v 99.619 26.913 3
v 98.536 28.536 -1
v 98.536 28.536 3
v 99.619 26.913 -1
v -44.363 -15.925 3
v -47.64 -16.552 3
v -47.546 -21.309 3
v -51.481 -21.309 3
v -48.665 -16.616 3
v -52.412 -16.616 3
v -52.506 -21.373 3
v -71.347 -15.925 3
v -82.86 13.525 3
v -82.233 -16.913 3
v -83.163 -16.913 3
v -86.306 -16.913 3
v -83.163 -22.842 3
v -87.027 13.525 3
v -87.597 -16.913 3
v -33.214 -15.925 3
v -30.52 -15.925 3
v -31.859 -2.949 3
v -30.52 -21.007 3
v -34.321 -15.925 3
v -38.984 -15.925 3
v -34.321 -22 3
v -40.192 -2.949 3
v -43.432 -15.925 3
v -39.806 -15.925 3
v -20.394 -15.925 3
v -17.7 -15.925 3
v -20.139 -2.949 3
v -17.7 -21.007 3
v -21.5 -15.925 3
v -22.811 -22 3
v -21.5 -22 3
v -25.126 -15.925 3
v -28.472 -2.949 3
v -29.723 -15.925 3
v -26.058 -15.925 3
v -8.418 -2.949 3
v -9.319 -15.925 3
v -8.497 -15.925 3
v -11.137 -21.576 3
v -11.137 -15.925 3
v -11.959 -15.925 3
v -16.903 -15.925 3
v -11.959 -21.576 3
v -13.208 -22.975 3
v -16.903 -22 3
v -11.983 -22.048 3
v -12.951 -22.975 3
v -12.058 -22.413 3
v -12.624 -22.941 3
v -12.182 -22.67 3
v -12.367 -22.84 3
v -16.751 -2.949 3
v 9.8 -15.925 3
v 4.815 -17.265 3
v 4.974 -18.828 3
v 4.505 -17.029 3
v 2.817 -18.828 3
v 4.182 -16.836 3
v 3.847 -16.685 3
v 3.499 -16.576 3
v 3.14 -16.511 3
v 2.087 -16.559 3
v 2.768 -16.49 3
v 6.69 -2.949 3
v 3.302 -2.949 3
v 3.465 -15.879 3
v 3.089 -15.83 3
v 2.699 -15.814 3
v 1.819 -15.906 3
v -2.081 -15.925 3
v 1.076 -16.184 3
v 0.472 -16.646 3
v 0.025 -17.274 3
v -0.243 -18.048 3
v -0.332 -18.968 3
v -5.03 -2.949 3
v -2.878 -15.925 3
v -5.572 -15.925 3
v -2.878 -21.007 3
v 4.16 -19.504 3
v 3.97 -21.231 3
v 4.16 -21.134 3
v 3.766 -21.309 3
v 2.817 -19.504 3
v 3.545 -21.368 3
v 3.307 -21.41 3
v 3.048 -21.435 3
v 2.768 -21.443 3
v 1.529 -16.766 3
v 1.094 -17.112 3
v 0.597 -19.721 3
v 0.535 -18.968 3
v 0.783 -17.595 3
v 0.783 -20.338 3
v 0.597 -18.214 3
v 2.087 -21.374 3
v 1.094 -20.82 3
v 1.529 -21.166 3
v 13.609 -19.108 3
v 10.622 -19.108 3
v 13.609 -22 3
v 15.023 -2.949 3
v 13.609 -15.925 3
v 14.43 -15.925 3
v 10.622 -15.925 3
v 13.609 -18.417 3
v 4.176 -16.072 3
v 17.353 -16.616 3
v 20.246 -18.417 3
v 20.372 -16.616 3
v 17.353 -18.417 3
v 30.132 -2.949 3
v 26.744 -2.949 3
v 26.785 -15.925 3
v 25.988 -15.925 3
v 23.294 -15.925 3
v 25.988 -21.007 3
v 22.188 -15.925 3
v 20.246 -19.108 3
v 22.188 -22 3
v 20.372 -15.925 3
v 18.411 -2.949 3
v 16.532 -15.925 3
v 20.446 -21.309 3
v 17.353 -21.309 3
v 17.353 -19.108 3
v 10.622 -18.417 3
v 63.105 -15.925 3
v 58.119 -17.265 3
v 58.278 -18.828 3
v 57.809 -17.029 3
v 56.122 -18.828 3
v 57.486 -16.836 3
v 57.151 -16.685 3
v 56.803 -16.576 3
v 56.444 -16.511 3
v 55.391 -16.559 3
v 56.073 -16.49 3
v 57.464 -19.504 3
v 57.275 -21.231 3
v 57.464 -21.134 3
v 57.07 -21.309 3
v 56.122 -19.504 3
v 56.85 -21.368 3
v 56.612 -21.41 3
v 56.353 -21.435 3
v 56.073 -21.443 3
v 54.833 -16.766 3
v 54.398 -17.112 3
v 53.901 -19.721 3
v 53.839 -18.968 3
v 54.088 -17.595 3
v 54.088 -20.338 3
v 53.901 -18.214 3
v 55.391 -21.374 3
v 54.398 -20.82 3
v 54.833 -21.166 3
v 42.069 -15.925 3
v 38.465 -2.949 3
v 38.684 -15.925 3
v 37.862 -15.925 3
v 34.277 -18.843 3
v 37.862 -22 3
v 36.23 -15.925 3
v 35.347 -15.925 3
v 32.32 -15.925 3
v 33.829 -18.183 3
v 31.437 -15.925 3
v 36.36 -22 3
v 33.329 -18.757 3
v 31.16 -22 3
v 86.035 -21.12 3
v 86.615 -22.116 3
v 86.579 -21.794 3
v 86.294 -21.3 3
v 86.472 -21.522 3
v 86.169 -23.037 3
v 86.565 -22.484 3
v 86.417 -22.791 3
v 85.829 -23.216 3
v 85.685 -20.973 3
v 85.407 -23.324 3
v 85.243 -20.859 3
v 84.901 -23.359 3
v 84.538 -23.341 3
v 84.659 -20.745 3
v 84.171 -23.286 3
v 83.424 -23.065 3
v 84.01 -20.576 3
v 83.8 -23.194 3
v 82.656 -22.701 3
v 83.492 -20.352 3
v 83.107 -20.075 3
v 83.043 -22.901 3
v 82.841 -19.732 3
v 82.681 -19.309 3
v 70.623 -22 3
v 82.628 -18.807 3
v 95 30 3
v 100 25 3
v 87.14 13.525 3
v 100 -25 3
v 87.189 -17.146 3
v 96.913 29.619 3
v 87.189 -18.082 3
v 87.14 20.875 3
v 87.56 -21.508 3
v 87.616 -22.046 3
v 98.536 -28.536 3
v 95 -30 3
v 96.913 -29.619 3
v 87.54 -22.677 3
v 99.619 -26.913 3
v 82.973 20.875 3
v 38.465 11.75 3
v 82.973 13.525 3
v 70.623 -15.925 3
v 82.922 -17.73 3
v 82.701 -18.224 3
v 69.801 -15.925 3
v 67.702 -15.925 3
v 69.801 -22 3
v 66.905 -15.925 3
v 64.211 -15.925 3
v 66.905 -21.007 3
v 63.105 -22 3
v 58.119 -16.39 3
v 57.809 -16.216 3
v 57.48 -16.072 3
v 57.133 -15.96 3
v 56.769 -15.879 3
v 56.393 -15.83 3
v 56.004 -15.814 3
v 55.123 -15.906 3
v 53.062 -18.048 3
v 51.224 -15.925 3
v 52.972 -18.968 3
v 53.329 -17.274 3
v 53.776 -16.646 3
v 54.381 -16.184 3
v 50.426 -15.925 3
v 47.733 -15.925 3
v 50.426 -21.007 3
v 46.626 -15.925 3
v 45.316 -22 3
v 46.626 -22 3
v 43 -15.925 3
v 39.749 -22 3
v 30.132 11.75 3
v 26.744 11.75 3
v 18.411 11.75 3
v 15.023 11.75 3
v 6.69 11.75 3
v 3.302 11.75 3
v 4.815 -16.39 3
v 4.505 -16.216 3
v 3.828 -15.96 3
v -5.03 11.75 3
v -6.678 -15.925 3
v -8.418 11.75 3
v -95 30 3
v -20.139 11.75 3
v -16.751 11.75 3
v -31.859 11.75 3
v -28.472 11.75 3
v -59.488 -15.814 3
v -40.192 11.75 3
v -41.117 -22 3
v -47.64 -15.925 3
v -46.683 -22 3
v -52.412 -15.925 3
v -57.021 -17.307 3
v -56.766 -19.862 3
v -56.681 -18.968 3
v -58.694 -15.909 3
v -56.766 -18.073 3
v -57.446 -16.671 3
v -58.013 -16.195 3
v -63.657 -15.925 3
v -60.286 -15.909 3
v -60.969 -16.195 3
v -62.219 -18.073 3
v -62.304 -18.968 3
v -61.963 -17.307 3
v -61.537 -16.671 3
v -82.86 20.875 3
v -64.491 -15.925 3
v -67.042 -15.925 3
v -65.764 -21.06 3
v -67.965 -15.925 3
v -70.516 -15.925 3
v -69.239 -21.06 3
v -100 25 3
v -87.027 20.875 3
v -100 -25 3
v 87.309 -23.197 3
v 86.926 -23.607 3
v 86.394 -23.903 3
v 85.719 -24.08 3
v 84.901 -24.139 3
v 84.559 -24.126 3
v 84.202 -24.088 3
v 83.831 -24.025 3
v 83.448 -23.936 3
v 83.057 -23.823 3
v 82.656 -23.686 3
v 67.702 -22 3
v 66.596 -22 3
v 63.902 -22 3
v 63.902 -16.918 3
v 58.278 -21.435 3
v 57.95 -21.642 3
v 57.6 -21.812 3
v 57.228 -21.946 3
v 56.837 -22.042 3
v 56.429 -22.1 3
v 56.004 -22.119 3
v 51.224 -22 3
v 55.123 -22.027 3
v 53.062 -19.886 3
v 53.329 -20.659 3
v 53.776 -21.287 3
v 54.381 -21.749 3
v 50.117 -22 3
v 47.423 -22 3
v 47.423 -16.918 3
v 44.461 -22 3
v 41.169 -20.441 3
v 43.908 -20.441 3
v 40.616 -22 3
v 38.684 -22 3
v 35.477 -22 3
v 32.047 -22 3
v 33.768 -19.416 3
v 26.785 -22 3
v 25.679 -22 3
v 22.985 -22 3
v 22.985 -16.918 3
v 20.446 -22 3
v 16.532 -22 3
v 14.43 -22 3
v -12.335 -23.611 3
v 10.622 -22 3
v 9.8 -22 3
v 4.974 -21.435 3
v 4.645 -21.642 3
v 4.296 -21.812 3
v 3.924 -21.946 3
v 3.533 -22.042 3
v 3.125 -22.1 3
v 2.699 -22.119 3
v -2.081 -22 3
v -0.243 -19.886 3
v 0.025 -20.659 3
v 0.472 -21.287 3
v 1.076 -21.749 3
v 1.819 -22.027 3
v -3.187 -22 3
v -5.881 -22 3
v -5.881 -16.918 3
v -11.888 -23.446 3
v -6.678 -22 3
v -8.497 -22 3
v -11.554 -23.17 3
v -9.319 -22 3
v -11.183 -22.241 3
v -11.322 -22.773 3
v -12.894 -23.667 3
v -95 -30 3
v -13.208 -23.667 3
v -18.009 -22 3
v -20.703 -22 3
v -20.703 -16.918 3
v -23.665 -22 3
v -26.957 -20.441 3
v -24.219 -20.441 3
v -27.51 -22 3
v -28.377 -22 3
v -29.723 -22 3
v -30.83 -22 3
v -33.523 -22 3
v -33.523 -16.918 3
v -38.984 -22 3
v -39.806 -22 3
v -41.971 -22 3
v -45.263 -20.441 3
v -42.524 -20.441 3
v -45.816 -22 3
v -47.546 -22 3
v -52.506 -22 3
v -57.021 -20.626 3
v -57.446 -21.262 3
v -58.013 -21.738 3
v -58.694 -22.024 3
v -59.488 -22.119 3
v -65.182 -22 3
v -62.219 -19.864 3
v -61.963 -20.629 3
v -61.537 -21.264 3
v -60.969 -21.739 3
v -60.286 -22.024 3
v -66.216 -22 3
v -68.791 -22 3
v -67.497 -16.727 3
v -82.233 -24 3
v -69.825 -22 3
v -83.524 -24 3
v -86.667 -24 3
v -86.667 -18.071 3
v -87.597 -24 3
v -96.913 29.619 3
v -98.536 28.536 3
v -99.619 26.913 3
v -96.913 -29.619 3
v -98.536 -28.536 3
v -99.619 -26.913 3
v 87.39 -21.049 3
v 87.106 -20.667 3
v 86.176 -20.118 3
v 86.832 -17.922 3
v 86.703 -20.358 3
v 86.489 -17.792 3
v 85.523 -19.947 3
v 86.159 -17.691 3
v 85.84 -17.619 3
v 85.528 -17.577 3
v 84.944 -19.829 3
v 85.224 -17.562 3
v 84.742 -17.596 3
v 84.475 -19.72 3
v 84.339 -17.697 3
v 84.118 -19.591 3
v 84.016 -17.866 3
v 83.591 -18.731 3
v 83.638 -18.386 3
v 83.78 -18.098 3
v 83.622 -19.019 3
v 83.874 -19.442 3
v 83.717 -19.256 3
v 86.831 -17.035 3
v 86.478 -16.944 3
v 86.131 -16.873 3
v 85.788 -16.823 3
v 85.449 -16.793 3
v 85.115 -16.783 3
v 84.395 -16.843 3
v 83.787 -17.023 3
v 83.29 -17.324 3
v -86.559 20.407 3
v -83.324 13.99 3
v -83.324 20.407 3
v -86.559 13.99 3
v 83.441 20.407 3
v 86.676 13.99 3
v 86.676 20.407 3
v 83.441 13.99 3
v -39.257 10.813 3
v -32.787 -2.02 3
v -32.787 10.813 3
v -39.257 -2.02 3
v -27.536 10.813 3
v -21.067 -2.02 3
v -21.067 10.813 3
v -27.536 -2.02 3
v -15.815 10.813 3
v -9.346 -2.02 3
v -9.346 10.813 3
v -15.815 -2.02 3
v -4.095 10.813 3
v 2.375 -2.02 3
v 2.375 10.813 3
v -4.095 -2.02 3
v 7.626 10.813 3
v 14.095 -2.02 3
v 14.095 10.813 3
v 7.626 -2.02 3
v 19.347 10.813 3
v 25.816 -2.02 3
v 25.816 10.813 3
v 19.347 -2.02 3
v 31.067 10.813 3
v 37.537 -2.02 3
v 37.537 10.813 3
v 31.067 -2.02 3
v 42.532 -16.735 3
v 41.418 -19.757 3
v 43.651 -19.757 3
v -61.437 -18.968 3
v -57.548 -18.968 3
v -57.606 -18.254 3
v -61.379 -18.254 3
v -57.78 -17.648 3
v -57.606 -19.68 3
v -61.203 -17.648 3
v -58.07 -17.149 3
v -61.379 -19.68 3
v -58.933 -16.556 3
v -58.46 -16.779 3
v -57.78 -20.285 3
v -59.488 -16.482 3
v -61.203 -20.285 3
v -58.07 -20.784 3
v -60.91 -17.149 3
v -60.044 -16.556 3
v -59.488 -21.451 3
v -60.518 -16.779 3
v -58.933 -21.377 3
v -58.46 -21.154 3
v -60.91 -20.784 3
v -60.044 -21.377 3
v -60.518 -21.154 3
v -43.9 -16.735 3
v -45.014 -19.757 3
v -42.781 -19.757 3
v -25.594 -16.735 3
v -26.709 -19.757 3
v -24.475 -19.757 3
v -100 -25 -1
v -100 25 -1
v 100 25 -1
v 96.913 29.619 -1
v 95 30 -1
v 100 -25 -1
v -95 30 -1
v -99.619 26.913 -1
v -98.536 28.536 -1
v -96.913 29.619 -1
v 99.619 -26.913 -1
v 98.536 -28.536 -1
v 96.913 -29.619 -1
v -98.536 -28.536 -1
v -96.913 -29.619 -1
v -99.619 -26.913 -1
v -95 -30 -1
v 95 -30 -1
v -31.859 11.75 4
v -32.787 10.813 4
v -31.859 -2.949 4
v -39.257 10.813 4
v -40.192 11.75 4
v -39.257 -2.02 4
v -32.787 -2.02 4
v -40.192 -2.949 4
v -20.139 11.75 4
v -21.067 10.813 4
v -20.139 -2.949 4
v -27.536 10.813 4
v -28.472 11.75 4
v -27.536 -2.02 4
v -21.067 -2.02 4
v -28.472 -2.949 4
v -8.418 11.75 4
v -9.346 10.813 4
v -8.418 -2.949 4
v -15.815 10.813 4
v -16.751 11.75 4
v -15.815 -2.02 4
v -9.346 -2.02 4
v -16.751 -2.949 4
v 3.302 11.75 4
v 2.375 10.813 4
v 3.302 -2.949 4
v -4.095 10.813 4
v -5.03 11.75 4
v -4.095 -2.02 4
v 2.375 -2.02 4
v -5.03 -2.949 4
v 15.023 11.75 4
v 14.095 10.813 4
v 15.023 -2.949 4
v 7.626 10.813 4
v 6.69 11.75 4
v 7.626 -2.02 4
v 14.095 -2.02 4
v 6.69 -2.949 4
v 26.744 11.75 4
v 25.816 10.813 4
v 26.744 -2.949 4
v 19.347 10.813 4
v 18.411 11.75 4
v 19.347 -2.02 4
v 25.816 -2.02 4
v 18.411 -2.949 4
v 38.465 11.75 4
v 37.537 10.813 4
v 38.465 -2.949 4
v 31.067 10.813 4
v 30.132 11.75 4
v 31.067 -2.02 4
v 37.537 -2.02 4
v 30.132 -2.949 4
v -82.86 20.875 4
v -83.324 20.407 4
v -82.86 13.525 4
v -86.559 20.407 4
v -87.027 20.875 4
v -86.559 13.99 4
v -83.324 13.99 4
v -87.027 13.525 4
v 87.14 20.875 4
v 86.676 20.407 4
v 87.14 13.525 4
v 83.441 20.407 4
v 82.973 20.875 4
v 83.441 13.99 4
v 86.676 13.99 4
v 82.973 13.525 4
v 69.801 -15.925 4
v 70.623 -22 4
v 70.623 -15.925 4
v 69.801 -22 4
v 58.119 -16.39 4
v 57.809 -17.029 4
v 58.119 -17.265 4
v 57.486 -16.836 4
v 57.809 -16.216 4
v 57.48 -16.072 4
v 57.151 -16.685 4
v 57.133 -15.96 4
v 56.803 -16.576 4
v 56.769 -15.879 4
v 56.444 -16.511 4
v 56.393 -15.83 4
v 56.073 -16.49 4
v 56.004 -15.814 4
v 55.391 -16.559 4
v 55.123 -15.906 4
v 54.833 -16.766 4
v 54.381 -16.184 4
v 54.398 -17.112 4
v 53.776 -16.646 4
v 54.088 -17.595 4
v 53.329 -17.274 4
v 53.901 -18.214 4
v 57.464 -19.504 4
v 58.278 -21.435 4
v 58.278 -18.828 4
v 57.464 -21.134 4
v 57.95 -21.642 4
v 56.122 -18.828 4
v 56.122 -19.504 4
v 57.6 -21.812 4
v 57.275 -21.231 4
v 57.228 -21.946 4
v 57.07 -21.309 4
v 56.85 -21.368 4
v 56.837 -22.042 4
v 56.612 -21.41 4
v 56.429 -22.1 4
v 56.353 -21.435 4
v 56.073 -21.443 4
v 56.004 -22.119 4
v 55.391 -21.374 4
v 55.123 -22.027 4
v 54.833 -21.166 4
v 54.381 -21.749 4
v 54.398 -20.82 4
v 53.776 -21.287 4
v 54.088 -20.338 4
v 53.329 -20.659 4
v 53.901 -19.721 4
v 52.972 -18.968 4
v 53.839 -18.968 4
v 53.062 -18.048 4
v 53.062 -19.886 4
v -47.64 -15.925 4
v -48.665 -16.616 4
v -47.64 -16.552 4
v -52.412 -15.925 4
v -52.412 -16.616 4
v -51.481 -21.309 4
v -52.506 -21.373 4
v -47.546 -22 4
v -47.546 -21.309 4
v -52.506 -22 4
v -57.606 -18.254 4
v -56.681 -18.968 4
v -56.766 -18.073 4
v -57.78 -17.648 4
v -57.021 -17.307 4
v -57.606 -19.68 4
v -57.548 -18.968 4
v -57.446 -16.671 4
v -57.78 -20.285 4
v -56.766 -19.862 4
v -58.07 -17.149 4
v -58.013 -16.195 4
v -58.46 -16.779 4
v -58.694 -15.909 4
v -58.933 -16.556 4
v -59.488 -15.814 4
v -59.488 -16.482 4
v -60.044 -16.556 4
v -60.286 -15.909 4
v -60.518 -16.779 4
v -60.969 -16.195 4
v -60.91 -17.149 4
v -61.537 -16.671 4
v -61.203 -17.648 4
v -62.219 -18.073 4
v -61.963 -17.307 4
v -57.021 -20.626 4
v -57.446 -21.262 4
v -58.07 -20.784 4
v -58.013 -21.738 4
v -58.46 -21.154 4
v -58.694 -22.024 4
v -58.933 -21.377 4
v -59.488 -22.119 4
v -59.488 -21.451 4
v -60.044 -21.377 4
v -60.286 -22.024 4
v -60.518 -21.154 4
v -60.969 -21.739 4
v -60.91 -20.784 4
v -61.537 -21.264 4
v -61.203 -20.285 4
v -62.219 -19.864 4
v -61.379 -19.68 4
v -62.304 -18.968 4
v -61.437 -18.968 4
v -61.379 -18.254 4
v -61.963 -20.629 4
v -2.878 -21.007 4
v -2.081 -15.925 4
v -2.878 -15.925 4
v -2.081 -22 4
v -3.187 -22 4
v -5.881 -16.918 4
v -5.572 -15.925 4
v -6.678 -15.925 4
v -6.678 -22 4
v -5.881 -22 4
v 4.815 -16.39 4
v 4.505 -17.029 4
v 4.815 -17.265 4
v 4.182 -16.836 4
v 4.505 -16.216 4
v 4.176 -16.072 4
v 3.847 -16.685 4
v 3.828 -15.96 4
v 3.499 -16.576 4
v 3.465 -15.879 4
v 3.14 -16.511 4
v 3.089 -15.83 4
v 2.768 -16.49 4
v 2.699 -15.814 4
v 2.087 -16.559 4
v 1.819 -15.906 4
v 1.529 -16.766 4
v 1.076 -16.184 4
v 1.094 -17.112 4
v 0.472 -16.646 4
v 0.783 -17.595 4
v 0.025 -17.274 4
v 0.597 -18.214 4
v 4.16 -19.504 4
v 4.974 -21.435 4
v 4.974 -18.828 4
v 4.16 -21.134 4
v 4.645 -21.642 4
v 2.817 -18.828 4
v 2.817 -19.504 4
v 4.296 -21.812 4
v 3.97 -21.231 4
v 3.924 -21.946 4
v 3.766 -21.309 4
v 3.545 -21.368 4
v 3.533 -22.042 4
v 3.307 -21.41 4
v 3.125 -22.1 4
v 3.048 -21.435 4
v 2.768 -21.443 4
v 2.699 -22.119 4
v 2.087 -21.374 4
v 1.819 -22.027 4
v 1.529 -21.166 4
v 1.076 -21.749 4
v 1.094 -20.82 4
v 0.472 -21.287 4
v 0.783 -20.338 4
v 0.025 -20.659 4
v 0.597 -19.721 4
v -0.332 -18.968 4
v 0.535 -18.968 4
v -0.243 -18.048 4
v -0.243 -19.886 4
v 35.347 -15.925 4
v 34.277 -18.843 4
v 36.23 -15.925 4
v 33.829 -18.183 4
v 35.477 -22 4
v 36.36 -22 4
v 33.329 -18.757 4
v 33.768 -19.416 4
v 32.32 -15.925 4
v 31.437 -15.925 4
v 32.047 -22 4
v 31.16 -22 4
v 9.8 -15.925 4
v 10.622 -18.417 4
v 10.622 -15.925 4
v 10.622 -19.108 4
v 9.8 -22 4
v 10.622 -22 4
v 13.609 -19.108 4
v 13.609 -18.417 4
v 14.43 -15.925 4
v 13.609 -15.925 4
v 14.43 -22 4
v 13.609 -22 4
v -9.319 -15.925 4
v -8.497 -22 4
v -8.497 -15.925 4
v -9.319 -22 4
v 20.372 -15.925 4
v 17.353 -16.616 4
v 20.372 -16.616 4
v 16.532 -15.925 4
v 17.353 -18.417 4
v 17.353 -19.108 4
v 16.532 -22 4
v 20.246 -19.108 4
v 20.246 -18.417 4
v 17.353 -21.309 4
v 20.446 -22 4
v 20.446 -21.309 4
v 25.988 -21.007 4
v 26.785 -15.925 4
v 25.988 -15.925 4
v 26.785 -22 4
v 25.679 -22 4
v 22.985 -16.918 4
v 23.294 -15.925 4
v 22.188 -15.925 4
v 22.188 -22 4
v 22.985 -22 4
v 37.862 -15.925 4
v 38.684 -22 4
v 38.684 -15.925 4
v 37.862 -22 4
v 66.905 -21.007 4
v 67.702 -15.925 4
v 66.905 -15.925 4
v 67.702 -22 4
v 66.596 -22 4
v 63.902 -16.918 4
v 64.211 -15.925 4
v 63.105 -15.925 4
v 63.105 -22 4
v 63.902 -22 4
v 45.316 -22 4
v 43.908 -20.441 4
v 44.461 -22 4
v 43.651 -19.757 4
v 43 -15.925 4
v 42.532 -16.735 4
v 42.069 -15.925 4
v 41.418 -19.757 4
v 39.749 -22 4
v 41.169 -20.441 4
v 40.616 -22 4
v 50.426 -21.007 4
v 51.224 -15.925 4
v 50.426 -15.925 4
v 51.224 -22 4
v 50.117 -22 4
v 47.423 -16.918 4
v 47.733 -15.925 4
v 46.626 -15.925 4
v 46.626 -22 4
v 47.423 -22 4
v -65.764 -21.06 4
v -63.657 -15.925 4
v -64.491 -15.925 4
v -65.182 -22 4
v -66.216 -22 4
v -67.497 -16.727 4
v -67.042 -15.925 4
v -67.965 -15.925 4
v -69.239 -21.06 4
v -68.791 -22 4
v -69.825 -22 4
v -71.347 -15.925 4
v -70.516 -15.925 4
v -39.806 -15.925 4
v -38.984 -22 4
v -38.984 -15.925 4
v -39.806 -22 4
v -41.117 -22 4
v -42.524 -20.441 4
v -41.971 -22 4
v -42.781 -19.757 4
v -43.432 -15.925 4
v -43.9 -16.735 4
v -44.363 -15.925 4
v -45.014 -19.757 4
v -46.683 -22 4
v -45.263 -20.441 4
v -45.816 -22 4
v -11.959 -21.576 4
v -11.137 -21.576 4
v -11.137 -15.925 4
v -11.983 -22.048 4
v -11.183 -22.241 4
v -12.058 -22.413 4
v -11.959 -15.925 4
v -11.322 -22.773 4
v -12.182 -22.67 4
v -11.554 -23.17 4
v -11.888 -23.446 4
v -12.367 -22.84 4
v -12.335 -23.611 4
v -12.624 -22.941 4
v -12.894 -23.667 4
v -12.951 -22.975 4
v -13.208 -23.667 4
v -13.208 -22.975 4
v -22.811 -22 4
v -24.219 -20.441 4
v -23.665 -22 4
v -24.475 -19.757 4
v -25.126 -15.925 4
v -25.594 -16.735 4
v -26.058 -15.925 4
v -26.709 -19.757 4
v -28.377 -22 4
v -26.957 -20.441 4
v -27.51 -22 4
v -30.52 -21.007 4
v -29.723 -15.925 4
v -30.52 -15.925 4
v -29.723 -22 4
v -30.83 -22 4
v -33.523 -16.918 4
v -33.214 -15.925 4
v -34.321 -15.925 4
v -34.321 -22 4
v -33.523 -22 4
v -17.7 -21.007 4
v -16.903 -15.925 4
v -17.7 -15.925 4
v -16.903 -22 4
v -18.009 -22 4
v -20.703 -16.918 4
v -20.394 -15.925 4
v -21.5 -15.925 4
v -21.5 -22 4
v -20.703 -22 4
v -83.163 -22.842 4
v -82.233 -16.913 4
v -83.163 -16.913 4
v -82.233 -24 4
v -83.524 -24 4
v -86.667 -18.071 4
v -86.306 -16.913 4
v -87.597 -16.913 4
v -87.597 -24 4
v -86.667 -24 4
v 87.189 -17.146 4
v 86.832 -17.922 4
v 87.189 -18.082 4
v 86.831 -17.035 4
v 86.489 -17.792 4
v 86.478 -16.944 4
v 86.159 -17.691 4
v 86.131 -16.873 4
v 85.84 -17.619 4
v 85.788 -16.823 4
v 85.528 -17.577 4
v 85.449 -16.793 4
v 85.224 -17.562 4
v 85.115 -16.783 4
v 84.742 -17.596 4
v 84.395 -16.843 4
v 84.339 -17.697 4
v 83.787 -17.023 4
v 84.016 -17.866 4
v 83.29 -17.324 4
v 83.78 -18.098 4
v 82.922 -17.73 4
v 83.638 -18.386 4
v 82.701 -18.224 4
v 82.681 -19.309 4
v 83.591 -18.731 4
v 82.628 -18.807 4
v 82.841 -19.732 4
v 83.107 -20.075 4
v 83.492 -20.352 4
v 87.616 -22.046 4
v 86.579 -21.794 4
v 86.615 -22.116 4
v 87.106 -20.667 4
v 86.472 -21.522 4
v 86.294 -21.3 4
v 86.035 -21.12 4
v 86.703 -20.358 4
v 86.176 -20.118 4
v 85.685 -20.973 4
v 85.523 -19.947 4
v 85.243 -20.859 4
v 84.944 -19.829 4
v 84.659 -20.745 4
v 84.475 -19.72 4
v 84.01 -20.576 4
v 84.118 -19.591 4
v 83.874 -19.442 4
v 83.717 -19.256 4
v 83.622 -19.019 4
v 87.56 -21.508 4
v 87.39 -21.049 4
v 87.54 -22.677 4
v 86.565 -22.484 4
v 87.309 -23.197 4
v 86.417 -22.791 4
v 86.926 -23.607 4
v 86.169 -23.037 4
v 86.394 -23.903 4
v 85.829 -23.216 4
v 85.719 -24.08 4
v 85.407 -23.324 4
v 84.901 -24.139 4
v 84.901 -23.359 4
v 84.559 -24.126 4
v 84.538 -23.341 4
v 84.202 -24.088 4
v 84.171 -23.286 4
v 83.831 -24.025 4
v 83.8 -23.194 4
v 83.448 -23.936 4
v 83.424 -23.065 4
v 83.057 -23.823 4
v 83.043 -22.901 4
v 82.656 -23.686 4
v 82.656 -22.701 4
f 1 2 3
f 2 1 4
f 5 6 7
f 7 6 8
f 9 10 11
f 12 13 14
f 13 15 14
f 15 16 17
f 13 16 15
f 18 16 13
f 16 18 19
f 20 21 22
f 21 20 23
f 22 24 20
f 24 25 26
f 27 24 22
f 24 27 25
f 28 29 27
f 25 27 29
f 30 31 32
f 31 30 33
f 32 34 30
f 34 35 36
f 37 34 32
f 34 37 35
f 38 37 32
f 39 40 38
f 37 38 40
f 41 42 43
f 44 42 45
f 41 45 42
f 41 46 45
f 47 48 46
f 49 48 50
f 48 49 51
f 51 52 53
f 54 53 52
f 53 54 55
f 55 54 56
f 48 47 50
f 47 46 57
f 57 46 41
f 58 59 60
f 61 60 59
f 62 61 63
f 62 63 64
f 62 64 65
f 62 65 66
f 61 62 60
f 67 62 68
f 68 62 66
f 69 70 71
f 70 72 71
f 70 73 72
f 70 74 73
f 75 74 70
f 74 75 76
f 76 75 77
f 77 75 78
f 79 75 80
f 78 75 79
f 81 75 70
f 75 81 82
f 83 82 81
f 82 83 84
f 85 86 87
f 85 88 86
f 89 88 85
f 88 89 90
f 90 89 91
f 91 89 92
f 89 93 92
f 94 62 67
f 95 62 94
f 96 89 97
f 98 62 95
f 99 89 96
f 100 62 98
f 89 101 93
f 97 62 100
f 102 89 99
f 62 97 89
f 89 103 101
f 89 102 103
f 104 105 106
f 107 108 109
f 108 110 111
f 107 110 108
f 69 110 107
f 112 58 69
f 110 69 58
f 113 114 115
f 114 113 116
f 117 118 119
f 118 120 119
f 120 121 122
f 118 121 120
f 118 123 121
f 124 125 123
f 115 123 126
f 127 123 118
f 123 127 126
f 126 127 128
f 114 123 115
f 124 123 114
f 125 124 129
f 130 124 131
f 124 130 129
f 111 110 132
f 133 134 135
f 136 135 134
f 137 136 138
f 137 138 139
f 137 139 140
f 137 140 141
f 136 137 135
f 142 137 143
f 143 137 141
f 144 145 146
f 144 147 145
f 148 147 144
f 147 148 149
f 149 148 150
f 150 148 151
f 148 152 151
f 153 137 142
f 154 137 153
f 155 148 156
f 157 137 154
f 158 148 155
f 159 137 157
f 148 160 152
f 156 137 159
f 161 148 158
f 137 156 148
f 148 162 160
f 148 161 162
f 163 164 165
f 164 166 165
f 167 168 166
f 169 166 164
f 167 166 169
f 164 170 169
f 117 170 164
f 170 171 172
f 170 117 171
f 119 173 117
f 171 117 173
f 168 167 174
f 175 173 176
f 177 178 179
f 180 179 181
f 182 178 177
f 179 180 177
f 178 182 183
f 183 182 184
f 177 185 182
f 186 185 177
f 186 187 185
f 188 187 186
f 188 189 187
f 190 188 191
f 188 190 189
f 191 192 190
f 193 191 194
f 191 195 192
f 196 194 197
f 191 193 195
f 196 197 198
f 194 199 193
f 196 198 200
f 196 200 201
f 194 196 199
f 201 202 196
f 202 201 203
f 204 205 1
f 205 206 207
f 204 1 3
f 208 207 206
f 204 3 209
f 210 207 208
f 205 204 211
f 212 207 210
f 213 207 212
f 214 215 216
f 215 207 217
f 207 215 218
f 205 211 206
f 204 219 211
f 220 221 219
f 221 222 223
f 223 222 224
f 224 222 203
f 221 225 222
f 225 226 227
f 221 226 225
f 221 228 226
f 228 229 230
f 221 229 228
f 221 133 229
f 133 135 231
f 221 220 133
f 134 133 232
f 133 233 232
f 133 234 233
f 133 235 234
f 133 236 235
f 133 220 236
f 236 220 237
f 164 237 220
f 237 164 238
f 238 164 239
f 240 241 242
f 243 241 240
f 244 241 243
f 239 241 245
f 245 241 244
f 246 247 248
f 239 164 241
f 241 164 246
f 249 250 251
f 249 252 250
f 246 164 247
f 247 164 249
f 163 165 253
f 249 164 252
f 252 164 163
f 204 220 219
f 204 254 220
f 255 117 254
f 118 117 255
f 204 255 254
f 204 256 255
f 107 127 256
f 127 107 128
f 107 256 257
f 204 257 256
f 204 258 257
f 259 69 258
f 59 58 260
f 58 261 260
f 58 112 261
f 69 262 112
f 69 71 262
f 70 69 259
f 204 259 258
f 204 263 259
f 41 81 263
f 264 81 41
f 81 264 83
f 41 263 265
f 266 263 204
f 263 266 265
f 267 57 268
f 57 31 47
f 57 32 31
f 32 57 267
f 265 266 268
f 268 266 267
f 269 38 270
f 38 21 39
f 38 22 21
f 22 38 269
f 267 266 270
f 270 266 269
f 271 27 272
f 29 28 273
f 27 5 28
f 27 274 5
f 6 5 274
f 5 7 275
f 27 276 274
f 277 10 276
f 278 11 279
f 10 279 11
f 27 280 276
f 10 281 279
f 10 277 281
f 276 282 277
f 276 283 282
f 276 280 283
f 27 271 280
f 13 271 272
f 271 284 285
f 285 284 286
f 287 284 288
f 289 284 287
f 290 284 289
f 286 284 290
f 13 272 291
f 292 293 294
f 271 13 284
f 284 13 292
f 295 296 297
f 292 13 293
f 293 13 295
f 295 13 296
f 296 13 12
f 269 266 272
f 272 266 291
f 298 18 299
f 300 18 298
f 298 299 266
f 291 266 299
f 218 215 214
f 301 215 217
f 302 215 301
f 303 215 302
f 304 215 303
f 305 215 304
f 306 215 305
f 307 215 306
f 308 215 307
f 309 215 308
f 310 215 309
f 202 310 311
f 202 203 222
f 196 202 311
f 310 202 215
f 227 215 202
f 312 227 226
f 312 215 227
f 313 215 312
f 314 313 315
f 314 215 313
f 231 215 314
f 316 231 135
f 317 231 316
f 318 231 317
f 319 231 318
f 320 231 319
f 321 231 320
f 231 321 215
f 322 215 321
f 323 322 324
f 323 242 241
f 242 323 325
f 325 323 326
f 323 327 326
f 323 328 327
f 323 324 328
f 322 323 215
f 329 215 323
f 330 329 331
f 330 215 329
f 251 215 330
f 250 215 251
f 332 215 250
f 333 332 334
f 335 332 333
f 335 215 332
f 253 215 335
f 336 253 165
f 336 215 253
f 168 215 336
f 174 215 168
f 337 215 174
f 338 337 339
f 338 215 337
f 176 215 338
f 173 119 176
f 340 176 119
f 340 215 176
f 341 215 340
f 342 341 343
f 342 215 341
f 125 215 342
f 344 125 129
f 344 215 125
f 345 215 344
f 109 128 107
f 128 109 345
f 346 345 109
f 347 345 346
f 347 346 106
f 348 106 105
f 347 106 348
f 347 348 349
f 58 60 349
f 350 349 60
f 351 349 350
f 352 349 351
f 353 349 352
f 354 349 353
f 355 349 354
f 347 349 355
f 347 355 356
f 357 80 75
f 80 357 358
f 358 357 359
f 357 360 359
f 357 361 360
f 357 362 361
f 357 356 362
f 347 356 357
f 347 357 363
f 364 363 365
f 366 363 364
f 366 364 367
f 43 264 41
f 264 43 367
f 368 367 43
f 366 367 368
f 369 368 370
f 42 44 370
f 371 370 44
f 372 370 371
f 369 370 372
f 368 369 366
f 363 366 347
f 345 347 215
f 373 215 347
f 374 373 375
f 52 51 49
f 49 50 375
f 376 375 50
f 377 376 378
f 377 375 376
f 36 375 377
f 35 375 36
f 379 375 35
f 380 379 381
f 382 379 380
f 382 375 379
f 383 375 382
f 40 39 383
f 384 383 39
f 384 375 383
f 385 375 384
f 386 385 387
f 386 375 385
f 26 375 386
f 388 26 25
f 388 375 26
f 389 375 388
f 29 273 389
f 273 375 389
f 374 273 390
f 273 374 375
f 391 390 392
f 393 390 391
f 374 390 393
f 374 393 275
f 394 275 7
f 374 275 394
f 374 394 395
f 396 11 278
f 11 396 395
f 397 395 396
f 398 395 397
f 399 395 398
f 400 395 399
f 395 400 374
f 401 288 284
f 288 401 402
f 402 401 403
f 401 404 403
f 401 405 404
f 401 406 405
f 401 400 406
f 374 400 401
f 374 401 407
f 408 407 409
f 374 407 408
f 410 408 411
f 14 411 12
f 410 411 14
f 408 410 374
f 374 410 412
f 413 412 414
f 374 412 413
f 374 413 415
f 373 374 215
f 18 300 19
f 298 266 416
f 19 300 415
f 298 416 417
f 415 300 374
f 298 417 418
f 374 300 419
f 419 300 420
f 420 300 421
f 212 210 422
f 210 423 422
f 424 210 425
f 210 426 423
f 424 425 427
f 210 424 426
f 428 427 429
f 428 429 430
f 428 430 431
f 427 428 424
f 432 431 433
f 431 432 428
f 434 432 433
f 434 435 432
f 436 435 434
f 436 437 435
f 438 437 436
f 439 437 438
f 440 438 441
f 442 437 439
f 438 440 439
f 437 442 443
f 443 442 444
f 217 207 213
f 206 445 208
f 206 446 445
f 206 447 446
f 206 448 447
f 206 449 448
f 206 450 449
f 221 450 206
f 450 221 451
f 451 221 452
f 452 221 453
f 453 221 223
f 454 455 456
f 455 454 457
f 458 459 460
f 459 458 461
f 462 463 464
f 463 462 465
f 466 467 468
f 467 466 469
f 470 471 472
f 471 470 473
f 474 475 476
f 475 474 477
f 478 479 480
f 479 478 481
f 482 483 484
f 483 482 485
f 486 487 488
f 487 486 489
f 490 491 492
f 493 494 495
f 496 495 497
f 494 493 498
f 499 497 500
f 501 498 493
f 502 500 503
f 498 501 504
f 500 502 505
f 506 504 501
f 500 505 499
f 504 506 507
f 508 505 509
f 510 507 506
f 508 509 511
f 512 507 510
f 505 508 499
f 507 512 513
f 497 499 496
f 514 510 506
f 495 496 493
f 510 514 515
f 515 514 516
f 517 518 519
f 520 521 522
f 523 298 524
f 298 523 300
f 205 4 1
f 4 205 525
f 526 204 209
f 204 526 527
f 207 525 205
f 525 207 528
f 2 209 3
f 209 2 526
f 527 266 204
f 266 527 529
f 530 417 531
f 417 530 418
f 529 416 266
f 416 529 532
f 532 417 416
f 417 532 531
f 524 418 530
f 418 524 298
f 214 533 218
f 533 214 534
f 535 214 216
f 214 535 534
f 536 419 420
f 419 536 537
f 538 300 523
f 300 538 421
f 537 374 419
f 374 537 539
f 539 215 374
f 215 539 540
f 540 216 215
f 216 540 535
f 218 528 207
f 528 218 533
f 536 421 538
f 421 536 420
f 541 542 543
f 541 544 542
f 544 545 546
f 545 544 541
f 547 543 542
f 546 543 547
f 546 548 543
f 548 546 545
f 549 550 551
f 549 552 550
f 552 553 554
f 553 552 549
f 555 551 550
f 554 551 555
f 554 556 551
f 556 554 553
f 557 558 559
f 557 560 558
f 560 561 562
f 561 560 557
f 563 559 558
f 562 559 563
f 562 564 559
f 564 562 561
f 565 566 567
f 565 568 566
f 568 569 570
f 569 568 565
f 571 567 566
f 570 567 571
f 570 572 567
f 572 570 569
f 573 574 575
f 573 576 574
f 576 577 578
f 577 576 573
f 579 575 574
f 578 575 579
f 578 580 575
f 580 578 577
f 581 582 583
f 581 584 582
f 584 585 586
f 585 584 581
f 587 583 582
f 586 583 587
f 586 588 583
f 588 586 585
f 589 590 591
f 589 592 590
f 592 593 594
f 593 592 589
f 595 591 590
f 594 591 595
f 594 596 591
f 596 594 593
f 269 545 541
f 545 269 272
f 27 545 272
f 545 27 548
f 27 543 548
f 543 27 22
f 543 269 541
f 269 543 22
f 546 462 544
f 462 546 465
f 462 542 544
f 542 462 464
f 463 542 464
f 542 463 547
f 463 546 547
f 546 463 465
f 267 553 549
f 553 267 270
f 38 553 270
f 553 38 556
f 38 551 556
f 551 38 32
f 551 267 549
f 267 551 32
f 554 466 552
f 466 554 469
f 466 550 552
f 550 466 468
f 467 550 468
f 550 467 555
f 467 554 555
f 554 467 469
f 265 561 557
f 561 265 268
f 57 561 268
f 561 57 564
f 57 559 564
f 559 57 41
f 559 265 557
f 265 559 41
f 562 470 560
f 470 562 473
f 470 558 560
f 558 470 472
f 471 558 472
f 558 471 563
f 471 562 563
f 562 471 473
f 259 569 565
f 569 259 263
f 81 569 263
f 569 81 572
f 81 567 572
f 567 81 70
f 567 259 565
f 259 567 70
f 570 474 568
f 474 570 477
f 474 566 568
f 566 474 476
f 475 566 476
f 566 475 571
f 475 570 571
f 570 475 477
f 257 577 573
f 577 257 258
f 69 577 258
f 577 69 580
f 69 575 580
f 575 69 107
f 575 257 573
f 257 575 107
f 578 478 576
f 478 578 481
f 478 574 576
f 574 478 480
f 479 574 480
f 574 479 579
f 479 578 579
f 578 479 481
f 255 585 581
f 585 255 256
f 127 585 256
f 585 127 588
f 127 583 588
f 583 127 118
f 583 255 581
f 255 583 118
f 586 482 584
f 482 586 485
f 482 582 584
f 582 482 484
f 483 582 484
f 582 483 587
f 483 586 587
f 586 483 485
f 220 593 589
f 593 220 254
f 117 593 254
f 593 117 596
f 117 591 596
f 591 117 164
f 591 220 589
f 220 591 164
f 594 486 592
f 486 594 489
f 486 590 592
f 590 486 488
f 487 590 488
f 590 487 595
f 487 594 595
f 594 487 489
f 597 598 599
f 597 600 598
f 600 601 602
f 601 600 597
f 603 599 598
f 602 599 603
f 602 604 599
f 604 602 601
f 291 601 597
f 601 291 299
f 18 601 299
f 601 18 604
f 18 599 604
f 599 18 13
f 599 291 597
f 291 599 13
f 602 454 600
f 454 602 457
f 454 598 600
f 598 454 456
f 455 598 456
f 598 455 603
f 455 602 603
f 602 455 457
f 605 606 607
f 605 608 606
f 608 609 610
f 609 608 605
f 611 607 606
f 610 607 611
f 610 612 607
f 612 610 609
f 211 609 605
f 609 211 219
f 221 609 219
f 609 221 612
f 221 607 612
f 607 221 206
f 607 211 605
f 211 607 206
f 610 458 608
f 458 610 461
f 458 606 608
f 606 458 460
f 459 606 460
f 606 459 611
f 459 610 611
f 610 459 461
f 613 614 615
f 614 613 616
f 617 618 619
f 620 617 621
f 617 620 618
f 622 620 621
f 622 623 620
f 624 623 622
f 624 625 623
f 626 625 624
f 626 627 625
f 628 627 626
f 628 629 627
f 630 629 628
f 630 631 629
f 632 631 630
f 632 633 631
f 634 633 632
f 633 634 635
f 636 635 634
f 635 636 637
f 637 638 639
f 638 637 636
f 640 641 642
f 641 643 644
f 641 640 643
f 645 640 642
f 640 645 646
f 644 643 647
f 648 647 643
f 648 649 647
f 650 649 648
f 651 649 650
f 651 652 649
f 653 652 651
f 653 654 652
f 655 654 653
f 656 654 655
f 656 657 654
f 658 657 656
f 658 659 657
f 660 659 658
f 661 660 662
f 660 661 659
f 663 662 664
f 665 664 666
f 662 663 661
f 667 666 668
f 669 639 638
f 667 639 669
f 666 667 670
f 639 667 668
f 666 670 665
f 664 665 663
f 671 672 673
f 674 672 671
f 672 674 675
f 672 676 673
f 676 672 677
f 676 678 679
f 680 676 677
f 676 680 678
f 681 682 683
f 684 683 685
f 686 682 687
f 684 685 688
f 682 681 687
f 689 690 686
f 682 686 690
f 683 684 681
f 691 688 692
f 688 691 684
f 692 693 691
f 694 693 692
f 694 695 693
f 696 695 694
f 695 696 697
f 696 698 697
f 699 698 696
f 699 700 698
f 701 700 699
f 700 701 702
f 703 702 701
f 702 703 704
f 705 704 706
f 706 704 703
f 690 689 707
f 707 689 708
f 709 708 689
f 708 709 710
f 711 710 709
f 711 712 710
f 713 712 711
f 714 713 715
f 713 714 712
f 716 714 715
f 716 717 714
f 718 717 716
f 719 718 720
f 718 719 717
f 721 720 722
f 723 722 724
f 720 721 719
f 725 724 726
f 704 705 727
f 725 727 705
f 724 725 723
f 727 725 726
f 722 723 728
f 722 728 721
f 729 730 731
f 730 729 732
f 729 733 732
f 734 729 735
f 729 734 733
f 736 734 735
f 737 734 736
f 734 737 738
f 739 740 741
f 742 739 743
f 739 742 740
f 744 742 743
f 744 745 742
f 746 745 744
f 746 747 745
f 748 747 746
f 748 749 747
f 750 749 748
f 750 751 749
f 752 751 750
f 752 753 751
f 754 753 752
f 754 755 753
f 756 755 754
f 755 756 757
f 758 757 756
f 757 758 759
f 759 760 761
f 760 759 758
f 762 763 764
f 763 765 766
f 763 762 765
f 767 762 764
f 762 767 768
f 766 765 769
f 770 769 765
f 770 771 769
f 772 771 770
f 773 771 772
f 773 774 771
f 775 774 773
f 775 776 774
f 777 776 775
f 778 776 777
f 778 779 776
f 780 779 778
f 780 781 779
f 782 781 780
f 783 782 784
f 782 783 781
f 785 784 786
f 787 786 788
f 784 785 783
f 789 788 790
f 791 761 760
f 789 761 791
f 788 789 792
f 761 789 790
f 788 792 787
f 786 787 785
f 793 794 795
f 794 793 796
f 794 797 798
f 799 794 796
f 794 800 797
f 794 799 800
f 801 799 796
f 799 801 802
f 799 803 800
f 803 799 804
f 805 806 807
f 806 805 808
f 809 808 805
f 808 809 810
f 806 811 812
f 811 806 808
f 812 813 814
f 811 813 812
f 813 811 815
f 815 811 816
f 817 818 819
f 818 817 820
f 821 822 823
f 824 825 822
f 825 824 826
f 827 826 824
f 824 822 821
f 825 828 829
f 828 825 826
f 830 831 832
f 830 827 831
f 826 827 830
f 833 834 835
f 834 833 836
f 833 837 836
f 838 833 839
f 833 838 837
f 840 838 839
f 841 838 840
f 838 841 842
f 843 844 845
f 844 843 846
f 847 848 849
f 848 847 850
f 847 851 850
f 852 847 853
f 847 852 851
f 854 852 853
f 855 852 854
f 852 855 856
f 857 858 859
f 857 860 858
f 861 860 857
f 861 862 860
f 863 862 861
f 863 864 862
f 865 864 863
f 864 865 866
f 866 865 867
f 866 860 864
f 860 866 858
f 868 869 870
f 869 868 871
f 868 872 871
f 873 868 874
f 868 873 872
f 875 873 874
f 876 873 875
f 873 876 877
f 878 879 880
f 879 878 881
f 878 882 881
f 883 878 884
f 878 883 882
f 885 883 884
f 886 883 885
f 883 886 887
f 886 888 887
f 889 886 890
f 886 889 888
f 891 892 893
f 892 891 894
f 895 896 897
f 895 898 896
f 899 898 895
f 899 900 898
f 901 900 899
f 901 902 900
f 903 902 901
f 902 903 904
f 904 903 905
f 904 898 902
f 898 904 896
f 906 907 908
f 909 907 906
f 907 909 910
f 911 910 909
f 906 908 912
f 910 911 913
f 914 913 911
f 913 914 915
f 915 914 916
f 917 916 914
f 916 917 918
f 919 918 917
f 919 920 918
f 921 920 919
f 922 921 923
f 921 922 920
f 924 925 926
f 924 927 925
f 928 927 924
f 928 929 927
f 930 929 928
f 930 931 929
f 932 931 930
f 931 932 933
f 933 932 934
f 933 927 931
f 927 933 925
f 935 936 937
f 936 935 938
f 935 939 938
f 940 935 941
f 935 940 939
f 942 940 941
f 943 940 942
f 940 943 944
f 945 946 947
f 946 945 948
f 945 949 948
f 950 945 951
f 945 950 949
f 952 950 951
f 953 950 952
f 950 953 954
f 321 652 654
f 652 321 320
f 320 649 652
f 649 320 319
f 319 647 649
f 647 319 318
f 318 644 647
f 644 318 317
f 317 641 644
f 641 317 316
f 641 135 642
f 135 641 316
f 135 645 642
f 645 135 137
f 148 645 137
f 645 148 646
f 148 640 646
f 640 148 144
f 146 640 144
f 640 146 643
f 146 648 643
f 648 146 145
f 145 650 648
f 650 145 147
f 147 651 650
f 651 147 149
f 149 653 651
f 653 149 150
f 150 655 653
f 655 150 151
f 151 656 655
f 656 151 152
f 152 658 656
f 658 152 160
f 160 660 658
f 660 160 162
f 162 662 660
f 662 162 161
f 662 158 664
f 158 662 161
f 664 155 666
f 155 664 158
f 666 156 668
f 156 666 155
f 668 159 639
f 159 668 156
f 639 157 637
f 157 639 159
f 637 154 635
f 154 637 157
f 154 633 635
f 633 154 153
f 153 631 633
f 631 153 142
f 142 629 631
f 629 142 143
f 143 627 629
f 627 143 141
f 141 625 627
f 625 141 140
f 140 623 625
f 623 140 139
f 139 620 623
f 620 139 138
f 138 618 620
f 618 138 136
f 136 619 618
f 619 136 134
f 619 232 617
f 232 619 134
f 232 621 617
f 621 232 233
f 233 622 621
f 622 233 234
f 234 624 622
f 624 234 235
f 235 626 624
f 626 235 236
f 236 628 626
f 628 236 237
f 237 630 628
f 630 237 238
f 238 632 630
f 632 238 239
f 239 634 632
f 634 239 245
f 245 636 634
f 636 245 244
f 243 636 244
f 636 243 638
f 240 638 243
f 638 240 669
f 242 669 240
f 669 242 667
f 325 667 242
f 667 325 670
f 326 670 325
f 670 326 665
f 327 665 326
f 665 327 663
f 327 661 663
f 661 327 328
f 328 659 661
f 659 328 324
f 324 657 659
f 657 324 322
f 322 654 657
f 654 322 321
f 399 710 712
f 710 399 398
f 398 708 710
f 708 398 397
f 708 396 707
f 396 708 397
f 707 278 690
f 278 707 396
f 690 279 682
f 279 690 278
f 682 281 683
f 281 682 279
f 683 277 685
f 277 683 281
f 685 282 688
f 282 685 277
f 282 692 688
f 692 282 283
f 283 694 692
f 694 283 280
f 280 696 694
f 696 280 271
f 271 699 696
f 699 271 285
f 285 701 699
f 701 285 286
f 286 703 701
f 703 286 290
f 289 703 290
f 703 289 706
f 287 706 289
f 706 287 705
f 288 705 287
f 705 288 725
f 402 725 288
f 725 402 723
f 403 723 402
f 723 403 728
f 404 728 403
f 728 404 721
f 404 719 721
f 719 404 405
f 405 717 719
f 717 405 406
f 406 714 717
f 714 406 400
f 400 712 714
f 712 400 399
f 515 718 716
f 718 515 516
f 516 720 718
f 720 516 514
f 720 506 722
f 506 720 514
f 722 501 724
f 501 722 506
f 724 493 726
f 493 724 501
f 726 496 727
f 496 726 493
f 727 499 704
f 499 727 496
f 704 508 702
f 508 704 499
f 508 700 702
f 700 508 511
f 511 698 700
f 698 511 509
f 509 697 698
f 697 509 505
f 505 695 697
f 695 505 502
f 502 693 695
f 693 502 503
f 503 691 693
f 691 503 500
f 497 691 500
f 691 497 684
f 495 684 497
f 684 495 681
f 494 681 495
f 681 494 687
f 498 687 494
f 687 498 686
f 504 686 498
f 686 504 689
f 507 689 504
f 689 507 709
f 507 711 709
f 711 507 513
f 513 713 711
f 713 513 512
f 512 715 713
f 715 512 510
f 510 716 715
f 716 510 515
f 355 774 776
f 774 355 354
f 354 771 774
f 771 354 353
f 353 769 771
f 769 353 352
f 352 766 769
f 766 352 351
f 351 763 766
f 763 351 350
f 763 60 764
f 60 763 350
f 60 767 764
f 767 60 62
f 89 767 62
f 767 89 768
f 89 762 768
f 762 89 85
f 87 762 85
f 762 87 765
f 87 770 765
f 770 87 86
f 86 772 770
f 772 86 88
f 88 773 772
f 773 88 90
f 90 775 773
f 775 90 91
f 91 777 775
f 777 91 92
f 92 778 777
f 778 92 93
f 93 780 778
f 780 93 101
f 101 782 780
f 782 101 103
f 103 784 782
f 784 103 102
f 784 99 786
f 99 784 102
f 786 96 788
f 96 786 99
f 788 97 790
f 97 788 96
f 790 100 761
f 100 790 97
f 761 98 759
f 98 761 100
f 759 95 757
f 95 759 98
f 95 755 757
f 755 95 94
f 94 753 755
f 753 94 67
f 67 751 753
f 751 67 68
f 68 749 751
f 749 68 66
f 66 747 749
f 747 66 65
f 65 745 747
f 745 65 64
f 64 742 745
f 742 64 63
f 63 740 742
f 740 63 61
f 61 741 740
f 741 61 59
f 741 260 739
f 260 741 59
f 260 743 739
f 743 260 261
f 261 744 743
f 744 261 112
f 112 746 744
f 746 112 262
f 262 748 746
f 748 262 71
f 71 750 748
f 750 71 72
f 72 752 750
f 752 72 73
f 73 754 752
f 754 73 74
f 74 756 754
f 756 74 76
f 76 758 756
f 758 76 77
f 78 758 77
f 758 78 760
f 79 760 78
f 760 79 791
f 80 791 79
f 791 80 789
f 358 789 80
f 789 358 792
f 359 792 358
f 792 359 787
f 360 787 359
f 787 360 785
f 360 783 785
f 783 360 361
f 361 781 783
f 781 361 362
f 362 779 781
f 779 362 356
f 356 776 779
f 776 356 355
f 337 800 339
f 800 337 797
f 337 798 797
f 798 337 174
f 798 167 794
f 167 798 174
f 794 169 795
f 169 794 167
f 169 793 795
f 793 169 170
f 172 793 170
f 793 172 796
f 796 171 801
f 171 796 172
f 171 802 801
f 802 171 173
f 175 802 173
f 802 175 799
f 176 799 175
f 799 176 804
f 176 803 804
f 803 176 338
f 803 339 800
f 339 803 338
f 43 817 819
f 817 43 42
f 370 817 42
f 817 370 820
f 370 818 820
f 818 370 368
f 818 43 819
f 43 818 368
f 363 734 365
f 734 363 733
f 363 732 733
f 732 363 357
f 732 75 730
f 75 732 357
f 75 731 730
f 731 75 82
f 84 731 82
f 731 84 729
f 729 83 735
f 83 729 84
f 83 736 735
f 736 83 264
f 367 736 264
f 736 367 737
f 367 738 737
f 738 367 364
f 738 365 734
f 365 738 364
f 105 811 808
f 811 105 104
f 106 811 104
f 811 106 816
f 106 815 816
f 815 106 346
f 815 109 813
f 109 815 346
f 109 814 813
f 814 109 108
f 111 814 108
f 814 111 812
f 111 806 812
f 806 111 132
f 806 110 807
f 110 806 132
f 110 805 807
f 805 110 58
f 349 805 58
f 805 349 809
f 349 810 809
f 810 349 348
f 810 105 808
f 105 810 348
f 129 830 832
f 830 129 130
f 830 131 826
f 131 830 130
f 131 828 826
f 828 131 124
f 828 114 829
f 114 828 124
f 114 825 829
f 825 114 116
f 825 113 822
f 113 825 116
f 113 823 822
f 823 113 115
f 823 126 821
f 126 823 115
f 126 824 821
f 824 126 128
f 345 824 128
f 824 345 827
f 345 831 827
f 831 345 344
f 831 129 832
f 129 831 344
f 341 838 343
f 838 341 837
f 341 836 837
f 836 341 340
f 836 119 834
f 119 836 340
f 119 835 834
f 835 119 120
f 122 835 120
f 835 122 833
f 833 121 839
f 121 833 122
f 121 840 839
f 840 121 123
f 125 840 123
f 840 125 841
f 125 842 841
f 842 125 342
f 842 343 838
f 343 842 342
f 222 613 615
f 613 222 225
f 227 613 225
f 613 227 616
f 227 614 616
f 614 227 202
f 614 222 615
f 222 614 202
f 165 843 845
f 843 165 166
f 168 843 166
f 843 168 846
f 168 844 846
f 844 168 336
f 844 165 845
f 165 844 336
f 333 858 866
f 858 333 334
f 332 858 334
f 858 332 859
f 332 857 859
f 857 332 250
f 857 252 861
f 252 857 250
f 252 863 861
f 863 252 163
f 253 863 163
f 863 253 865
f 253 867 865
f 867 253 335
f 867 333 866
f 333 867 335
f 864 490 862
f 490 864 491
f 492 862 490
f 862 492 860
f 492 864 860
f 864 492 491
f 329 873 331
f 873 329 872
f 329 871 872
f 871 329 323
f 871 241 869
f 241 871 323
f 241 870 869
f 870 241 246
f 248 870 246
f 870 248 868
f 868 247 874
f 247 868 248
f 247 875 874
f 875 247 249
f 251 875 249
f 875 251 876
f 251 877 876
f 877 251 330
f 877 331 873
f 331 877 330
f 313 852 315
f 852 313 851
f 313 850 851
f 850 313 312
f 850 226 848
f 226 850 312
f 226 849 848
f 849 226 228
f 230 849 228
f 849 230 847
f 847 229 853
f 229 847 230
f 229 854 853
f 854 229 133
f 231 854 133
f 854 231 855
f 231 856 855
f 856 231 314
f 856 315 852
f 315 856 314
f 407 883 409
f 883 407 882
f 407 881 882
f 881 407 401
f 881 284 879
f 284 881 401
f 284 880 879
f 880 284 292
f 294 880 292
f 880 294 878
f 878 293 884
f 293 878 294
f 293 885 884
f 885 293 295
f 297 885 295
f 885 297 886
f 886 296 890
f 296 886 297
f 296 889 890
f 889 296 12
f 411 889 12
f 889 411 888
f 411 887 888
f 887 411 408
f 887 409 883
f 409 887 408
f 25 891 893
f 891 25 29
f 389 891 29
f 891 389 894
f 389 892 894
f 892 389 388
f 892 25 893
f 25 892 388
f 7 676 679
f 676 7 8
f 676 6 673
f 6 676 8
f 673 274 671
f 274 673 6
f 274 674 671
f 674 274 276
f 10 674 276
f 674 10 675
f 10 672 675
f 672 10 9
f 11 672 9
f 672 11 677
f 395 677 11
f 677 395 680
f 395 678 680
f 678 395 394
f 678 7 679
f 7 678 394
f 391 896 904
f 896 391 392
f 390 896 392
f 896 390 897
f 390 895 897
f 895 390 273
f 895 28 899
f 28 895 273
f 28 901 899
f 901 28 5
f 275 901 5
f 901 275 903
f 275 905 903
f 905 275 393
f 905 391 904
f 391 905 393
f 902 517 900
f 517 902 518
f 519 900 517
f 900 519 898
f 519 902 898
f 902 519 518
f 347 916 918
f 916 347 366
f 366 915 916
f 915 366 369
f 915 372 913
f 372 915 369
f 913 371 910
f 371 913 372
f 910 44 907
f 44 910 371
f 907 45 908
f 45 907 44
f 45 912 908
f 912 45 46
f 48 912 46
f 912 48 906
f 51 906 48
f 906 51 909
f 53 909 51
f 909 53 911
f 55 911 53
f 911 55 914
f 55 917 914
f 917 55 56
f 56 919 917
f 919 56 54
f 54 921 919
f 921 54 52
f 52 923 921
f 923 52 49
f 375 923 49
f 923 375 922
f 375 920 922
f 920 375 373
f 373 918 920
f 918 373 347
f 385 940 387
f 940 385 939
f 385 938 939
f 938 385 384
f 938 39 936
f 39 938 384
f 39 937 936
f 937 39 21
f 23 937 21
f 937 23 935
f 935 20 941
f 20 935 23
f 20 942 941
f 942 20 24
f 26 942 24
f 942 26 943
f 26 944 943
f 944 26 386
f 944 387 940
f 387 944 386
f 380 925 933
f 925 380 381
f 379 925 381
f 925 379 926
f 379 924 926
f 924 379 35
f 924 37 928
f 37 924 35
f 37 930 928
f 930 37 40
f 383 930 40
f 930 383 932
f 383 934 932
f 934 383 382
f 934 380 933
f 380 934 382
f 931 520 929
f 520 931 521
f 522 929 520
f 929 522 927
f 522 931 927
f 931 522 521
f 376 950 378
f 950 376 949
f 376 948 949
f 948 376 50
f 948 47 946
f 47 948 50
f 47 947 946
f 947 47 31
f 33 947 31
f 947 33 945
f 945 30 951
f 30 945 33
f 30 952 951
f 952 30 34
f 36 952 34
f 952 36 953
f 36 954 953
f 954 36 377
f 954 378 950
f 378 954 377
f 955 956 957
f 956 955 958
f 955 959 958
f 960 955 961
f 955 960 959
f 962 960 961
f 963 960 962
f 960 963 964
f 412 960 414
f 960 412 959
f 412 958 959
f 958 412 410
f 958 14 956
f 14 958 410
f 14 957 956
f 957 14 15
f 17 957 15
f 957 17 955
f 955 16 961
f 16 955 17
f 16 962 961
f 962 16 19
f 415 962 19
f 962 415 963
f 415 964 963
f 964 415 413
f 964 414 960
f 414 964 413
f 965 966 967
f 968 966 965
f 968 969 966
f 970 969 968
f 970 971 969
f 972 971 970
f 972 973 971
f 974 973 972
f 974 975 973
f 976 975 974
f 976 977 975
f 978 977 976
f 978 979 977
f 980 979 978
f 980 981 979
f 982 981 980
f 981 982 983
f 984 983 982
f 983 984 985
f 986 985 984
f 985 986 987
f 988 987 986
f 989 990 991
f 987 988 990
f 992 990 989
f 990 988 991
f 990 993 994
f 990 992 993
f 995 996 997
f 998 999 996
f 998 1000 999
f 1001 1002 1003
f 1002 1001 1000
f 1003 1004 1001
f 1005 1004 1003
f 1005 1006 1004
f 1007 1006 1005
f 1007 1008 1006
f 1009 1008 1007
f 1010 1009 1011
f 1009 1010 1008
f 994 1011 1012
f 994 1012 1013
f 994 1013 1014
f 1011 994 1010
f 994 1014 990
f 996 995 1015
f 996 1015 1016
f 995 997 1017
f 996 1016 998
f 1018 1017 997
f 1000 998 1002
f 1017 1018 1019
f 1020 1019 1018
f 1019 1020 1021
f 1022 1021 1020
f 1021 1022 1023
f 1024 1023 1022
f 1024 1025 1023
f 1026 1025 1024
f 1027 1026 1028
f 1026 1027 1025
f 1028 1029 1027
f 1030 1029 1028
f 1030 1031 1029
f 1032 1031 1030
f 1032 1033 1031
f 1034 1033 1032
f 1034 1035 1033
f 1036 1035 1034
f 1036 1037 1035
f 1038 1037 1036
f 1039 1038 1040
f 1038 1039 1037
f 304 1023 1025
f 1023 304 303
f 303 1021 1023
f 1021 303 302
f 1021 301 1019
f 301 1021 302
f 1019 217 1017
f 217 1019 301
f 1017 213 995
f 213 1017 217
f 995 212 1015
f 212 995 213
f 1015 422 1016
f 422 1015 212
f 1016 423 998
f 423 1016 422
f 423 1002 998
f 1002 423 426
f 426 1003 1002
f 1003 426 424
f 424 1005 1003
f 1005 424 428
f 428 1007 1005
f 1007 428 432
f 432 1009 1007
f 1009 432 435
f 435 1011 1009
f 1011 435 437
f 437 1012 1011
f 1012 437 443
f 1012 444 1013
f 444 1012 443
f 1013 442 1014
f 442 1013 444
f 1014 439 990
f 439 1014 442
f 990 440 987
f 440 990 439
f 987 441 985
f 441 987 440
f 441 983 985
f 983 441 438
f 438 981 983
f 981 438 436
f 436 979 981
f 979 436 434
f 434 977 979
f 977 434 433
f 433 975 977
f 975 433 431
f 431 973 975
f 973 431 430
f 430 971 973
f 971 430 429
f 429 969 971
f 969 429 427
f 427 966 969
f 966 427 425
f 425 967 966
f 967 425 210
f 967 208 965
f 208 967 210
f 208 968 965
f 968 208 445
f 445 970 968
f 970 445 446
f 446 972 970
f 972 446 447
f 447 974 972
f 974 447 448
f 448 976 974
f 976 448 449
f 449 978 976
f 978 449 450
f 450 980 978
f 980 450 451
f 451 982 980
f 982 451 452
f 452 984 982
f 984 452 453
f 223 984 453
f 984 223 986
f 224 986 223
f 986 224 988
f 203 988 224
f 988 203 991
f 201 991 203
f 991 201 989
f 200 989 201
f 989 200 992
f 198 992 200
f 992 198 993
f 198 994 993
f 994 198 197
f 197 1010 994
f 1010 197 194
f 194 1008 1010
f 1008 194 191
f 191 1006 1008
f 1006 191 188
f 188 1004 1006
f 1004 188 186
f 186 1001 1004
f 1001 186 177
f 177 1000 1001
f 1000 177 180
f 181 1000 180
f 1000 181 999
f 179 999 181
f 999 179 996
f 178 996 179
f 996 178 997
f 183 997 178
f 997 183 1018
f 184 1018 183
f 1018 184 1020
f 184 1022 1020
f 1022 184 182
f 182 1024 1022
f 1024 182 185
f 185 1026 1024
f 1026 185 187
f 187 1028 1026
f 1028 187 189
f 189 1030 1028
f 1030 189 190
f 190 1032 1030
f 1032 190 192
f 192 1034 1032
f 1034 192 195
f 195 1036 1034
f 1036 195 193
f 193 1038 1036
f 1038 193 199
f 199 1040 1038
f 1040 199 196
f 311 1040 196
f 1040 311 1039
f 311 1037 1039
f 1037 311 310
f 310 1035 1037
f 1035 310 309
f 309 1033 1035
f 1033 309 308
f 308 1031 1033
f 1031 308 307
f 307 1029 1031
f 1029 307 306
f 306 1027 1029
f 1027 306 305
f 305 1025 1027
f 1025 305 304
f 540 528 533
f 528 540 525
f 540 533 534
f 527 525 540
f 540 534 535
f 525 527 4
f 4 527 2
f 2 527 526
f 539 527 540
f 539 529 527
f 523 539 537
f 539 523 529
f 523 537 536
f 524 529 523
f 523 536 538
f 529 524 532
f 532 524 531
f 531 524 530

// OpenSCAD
// 文字内容
chinese_text = "我在公司想下班"; 
// 拼音内容
pinyin_text = "WO ZAI NAN JING HEN XIANG NI"; 

// 中文字体
chinese_font = "Noto Sans SC:style=Black";
// 拼音字体  
english_font = "Inter Tight:style=SemiBold";  



// 圆角半径   
corner_r = 5; 
// 文字凸起高度
text_height = 1;


/**
* 标牌参数
*/
// 宽度
width = 200;
// 高度  
height = 60;
// 厚度  
depth = 3; 


// 主体
union() {
    // 背面蓝色层
    color("RoyalBlue")
    translate([0, 0, -1])  // 向下偏移1mm
    linear_extrude(1)      // 1mm厚度
    offset(r=corner_r)
    offset(r=-corner_r)
    square([width, height], center=true);
    
    union() {
        // 蓝色主体部分（上面2/3）
        color("RoyalBlue")
        linear_extrude(depth)
        difference() {
            // 整体形状
            offset(r=corner_r)
            offset(r=-corner_r)
            square([width, height], center=true);
            // 减去下面1/3部分
            translate([0, -height/3])
            square([width+1, height/3], center=true);
        }
        
        // 白色底部部分（下面1/3）
        color("White")
        linear_extrude(depth)
        intersection() {
            // 整体形状
            offset(r=corner_r)
            offset(r=-corner_r)
            square([width, height], center=true);
            // 只保留下面1/3部分
            translate([0, -height/3])
            square([width+1, height/3], center=true);
        }
    }
    
    // 白色中文文字
    color("White") {
        // 主要中文文字
        translate([0, 0, depth])
        linear_extrude(text_height)
        text(chinese_text, size=12, spacing=1.2, halign="center", font=chinese_font);
        
        // 北标记
        translate([-width/2+15, height/2-15, depth])
        linear_extrude(text_height)
        text("北", size=6, halign="center", font=chinese_font);
        
        // 南标记
        translate([width/2-15, height/2-15, depth])
        linear_extrude(text_height)
        text("南", size=6, halign="center", font=chinese_font);
    }
    
    // 黑色文字
    color("Black") {
        // 拼音文字
        translate([0, -22, depth])
        linear_extrude(text_height)
        text(pinyin_text, size=6, spacing=1.1, halign="center", font=english_font);
        
        // N标记
        translate([-width/2+15, height/2-54, depth])
        linear_extrude(text_height)
        text("N", size=7, halign="center", font=english_font);
        
        // S标记
        translate([width/2-15, height/2-54, depth])
        linear_extrude(text_height)
        text("S", size=7, halign="center", font=english_font);
    }
}
